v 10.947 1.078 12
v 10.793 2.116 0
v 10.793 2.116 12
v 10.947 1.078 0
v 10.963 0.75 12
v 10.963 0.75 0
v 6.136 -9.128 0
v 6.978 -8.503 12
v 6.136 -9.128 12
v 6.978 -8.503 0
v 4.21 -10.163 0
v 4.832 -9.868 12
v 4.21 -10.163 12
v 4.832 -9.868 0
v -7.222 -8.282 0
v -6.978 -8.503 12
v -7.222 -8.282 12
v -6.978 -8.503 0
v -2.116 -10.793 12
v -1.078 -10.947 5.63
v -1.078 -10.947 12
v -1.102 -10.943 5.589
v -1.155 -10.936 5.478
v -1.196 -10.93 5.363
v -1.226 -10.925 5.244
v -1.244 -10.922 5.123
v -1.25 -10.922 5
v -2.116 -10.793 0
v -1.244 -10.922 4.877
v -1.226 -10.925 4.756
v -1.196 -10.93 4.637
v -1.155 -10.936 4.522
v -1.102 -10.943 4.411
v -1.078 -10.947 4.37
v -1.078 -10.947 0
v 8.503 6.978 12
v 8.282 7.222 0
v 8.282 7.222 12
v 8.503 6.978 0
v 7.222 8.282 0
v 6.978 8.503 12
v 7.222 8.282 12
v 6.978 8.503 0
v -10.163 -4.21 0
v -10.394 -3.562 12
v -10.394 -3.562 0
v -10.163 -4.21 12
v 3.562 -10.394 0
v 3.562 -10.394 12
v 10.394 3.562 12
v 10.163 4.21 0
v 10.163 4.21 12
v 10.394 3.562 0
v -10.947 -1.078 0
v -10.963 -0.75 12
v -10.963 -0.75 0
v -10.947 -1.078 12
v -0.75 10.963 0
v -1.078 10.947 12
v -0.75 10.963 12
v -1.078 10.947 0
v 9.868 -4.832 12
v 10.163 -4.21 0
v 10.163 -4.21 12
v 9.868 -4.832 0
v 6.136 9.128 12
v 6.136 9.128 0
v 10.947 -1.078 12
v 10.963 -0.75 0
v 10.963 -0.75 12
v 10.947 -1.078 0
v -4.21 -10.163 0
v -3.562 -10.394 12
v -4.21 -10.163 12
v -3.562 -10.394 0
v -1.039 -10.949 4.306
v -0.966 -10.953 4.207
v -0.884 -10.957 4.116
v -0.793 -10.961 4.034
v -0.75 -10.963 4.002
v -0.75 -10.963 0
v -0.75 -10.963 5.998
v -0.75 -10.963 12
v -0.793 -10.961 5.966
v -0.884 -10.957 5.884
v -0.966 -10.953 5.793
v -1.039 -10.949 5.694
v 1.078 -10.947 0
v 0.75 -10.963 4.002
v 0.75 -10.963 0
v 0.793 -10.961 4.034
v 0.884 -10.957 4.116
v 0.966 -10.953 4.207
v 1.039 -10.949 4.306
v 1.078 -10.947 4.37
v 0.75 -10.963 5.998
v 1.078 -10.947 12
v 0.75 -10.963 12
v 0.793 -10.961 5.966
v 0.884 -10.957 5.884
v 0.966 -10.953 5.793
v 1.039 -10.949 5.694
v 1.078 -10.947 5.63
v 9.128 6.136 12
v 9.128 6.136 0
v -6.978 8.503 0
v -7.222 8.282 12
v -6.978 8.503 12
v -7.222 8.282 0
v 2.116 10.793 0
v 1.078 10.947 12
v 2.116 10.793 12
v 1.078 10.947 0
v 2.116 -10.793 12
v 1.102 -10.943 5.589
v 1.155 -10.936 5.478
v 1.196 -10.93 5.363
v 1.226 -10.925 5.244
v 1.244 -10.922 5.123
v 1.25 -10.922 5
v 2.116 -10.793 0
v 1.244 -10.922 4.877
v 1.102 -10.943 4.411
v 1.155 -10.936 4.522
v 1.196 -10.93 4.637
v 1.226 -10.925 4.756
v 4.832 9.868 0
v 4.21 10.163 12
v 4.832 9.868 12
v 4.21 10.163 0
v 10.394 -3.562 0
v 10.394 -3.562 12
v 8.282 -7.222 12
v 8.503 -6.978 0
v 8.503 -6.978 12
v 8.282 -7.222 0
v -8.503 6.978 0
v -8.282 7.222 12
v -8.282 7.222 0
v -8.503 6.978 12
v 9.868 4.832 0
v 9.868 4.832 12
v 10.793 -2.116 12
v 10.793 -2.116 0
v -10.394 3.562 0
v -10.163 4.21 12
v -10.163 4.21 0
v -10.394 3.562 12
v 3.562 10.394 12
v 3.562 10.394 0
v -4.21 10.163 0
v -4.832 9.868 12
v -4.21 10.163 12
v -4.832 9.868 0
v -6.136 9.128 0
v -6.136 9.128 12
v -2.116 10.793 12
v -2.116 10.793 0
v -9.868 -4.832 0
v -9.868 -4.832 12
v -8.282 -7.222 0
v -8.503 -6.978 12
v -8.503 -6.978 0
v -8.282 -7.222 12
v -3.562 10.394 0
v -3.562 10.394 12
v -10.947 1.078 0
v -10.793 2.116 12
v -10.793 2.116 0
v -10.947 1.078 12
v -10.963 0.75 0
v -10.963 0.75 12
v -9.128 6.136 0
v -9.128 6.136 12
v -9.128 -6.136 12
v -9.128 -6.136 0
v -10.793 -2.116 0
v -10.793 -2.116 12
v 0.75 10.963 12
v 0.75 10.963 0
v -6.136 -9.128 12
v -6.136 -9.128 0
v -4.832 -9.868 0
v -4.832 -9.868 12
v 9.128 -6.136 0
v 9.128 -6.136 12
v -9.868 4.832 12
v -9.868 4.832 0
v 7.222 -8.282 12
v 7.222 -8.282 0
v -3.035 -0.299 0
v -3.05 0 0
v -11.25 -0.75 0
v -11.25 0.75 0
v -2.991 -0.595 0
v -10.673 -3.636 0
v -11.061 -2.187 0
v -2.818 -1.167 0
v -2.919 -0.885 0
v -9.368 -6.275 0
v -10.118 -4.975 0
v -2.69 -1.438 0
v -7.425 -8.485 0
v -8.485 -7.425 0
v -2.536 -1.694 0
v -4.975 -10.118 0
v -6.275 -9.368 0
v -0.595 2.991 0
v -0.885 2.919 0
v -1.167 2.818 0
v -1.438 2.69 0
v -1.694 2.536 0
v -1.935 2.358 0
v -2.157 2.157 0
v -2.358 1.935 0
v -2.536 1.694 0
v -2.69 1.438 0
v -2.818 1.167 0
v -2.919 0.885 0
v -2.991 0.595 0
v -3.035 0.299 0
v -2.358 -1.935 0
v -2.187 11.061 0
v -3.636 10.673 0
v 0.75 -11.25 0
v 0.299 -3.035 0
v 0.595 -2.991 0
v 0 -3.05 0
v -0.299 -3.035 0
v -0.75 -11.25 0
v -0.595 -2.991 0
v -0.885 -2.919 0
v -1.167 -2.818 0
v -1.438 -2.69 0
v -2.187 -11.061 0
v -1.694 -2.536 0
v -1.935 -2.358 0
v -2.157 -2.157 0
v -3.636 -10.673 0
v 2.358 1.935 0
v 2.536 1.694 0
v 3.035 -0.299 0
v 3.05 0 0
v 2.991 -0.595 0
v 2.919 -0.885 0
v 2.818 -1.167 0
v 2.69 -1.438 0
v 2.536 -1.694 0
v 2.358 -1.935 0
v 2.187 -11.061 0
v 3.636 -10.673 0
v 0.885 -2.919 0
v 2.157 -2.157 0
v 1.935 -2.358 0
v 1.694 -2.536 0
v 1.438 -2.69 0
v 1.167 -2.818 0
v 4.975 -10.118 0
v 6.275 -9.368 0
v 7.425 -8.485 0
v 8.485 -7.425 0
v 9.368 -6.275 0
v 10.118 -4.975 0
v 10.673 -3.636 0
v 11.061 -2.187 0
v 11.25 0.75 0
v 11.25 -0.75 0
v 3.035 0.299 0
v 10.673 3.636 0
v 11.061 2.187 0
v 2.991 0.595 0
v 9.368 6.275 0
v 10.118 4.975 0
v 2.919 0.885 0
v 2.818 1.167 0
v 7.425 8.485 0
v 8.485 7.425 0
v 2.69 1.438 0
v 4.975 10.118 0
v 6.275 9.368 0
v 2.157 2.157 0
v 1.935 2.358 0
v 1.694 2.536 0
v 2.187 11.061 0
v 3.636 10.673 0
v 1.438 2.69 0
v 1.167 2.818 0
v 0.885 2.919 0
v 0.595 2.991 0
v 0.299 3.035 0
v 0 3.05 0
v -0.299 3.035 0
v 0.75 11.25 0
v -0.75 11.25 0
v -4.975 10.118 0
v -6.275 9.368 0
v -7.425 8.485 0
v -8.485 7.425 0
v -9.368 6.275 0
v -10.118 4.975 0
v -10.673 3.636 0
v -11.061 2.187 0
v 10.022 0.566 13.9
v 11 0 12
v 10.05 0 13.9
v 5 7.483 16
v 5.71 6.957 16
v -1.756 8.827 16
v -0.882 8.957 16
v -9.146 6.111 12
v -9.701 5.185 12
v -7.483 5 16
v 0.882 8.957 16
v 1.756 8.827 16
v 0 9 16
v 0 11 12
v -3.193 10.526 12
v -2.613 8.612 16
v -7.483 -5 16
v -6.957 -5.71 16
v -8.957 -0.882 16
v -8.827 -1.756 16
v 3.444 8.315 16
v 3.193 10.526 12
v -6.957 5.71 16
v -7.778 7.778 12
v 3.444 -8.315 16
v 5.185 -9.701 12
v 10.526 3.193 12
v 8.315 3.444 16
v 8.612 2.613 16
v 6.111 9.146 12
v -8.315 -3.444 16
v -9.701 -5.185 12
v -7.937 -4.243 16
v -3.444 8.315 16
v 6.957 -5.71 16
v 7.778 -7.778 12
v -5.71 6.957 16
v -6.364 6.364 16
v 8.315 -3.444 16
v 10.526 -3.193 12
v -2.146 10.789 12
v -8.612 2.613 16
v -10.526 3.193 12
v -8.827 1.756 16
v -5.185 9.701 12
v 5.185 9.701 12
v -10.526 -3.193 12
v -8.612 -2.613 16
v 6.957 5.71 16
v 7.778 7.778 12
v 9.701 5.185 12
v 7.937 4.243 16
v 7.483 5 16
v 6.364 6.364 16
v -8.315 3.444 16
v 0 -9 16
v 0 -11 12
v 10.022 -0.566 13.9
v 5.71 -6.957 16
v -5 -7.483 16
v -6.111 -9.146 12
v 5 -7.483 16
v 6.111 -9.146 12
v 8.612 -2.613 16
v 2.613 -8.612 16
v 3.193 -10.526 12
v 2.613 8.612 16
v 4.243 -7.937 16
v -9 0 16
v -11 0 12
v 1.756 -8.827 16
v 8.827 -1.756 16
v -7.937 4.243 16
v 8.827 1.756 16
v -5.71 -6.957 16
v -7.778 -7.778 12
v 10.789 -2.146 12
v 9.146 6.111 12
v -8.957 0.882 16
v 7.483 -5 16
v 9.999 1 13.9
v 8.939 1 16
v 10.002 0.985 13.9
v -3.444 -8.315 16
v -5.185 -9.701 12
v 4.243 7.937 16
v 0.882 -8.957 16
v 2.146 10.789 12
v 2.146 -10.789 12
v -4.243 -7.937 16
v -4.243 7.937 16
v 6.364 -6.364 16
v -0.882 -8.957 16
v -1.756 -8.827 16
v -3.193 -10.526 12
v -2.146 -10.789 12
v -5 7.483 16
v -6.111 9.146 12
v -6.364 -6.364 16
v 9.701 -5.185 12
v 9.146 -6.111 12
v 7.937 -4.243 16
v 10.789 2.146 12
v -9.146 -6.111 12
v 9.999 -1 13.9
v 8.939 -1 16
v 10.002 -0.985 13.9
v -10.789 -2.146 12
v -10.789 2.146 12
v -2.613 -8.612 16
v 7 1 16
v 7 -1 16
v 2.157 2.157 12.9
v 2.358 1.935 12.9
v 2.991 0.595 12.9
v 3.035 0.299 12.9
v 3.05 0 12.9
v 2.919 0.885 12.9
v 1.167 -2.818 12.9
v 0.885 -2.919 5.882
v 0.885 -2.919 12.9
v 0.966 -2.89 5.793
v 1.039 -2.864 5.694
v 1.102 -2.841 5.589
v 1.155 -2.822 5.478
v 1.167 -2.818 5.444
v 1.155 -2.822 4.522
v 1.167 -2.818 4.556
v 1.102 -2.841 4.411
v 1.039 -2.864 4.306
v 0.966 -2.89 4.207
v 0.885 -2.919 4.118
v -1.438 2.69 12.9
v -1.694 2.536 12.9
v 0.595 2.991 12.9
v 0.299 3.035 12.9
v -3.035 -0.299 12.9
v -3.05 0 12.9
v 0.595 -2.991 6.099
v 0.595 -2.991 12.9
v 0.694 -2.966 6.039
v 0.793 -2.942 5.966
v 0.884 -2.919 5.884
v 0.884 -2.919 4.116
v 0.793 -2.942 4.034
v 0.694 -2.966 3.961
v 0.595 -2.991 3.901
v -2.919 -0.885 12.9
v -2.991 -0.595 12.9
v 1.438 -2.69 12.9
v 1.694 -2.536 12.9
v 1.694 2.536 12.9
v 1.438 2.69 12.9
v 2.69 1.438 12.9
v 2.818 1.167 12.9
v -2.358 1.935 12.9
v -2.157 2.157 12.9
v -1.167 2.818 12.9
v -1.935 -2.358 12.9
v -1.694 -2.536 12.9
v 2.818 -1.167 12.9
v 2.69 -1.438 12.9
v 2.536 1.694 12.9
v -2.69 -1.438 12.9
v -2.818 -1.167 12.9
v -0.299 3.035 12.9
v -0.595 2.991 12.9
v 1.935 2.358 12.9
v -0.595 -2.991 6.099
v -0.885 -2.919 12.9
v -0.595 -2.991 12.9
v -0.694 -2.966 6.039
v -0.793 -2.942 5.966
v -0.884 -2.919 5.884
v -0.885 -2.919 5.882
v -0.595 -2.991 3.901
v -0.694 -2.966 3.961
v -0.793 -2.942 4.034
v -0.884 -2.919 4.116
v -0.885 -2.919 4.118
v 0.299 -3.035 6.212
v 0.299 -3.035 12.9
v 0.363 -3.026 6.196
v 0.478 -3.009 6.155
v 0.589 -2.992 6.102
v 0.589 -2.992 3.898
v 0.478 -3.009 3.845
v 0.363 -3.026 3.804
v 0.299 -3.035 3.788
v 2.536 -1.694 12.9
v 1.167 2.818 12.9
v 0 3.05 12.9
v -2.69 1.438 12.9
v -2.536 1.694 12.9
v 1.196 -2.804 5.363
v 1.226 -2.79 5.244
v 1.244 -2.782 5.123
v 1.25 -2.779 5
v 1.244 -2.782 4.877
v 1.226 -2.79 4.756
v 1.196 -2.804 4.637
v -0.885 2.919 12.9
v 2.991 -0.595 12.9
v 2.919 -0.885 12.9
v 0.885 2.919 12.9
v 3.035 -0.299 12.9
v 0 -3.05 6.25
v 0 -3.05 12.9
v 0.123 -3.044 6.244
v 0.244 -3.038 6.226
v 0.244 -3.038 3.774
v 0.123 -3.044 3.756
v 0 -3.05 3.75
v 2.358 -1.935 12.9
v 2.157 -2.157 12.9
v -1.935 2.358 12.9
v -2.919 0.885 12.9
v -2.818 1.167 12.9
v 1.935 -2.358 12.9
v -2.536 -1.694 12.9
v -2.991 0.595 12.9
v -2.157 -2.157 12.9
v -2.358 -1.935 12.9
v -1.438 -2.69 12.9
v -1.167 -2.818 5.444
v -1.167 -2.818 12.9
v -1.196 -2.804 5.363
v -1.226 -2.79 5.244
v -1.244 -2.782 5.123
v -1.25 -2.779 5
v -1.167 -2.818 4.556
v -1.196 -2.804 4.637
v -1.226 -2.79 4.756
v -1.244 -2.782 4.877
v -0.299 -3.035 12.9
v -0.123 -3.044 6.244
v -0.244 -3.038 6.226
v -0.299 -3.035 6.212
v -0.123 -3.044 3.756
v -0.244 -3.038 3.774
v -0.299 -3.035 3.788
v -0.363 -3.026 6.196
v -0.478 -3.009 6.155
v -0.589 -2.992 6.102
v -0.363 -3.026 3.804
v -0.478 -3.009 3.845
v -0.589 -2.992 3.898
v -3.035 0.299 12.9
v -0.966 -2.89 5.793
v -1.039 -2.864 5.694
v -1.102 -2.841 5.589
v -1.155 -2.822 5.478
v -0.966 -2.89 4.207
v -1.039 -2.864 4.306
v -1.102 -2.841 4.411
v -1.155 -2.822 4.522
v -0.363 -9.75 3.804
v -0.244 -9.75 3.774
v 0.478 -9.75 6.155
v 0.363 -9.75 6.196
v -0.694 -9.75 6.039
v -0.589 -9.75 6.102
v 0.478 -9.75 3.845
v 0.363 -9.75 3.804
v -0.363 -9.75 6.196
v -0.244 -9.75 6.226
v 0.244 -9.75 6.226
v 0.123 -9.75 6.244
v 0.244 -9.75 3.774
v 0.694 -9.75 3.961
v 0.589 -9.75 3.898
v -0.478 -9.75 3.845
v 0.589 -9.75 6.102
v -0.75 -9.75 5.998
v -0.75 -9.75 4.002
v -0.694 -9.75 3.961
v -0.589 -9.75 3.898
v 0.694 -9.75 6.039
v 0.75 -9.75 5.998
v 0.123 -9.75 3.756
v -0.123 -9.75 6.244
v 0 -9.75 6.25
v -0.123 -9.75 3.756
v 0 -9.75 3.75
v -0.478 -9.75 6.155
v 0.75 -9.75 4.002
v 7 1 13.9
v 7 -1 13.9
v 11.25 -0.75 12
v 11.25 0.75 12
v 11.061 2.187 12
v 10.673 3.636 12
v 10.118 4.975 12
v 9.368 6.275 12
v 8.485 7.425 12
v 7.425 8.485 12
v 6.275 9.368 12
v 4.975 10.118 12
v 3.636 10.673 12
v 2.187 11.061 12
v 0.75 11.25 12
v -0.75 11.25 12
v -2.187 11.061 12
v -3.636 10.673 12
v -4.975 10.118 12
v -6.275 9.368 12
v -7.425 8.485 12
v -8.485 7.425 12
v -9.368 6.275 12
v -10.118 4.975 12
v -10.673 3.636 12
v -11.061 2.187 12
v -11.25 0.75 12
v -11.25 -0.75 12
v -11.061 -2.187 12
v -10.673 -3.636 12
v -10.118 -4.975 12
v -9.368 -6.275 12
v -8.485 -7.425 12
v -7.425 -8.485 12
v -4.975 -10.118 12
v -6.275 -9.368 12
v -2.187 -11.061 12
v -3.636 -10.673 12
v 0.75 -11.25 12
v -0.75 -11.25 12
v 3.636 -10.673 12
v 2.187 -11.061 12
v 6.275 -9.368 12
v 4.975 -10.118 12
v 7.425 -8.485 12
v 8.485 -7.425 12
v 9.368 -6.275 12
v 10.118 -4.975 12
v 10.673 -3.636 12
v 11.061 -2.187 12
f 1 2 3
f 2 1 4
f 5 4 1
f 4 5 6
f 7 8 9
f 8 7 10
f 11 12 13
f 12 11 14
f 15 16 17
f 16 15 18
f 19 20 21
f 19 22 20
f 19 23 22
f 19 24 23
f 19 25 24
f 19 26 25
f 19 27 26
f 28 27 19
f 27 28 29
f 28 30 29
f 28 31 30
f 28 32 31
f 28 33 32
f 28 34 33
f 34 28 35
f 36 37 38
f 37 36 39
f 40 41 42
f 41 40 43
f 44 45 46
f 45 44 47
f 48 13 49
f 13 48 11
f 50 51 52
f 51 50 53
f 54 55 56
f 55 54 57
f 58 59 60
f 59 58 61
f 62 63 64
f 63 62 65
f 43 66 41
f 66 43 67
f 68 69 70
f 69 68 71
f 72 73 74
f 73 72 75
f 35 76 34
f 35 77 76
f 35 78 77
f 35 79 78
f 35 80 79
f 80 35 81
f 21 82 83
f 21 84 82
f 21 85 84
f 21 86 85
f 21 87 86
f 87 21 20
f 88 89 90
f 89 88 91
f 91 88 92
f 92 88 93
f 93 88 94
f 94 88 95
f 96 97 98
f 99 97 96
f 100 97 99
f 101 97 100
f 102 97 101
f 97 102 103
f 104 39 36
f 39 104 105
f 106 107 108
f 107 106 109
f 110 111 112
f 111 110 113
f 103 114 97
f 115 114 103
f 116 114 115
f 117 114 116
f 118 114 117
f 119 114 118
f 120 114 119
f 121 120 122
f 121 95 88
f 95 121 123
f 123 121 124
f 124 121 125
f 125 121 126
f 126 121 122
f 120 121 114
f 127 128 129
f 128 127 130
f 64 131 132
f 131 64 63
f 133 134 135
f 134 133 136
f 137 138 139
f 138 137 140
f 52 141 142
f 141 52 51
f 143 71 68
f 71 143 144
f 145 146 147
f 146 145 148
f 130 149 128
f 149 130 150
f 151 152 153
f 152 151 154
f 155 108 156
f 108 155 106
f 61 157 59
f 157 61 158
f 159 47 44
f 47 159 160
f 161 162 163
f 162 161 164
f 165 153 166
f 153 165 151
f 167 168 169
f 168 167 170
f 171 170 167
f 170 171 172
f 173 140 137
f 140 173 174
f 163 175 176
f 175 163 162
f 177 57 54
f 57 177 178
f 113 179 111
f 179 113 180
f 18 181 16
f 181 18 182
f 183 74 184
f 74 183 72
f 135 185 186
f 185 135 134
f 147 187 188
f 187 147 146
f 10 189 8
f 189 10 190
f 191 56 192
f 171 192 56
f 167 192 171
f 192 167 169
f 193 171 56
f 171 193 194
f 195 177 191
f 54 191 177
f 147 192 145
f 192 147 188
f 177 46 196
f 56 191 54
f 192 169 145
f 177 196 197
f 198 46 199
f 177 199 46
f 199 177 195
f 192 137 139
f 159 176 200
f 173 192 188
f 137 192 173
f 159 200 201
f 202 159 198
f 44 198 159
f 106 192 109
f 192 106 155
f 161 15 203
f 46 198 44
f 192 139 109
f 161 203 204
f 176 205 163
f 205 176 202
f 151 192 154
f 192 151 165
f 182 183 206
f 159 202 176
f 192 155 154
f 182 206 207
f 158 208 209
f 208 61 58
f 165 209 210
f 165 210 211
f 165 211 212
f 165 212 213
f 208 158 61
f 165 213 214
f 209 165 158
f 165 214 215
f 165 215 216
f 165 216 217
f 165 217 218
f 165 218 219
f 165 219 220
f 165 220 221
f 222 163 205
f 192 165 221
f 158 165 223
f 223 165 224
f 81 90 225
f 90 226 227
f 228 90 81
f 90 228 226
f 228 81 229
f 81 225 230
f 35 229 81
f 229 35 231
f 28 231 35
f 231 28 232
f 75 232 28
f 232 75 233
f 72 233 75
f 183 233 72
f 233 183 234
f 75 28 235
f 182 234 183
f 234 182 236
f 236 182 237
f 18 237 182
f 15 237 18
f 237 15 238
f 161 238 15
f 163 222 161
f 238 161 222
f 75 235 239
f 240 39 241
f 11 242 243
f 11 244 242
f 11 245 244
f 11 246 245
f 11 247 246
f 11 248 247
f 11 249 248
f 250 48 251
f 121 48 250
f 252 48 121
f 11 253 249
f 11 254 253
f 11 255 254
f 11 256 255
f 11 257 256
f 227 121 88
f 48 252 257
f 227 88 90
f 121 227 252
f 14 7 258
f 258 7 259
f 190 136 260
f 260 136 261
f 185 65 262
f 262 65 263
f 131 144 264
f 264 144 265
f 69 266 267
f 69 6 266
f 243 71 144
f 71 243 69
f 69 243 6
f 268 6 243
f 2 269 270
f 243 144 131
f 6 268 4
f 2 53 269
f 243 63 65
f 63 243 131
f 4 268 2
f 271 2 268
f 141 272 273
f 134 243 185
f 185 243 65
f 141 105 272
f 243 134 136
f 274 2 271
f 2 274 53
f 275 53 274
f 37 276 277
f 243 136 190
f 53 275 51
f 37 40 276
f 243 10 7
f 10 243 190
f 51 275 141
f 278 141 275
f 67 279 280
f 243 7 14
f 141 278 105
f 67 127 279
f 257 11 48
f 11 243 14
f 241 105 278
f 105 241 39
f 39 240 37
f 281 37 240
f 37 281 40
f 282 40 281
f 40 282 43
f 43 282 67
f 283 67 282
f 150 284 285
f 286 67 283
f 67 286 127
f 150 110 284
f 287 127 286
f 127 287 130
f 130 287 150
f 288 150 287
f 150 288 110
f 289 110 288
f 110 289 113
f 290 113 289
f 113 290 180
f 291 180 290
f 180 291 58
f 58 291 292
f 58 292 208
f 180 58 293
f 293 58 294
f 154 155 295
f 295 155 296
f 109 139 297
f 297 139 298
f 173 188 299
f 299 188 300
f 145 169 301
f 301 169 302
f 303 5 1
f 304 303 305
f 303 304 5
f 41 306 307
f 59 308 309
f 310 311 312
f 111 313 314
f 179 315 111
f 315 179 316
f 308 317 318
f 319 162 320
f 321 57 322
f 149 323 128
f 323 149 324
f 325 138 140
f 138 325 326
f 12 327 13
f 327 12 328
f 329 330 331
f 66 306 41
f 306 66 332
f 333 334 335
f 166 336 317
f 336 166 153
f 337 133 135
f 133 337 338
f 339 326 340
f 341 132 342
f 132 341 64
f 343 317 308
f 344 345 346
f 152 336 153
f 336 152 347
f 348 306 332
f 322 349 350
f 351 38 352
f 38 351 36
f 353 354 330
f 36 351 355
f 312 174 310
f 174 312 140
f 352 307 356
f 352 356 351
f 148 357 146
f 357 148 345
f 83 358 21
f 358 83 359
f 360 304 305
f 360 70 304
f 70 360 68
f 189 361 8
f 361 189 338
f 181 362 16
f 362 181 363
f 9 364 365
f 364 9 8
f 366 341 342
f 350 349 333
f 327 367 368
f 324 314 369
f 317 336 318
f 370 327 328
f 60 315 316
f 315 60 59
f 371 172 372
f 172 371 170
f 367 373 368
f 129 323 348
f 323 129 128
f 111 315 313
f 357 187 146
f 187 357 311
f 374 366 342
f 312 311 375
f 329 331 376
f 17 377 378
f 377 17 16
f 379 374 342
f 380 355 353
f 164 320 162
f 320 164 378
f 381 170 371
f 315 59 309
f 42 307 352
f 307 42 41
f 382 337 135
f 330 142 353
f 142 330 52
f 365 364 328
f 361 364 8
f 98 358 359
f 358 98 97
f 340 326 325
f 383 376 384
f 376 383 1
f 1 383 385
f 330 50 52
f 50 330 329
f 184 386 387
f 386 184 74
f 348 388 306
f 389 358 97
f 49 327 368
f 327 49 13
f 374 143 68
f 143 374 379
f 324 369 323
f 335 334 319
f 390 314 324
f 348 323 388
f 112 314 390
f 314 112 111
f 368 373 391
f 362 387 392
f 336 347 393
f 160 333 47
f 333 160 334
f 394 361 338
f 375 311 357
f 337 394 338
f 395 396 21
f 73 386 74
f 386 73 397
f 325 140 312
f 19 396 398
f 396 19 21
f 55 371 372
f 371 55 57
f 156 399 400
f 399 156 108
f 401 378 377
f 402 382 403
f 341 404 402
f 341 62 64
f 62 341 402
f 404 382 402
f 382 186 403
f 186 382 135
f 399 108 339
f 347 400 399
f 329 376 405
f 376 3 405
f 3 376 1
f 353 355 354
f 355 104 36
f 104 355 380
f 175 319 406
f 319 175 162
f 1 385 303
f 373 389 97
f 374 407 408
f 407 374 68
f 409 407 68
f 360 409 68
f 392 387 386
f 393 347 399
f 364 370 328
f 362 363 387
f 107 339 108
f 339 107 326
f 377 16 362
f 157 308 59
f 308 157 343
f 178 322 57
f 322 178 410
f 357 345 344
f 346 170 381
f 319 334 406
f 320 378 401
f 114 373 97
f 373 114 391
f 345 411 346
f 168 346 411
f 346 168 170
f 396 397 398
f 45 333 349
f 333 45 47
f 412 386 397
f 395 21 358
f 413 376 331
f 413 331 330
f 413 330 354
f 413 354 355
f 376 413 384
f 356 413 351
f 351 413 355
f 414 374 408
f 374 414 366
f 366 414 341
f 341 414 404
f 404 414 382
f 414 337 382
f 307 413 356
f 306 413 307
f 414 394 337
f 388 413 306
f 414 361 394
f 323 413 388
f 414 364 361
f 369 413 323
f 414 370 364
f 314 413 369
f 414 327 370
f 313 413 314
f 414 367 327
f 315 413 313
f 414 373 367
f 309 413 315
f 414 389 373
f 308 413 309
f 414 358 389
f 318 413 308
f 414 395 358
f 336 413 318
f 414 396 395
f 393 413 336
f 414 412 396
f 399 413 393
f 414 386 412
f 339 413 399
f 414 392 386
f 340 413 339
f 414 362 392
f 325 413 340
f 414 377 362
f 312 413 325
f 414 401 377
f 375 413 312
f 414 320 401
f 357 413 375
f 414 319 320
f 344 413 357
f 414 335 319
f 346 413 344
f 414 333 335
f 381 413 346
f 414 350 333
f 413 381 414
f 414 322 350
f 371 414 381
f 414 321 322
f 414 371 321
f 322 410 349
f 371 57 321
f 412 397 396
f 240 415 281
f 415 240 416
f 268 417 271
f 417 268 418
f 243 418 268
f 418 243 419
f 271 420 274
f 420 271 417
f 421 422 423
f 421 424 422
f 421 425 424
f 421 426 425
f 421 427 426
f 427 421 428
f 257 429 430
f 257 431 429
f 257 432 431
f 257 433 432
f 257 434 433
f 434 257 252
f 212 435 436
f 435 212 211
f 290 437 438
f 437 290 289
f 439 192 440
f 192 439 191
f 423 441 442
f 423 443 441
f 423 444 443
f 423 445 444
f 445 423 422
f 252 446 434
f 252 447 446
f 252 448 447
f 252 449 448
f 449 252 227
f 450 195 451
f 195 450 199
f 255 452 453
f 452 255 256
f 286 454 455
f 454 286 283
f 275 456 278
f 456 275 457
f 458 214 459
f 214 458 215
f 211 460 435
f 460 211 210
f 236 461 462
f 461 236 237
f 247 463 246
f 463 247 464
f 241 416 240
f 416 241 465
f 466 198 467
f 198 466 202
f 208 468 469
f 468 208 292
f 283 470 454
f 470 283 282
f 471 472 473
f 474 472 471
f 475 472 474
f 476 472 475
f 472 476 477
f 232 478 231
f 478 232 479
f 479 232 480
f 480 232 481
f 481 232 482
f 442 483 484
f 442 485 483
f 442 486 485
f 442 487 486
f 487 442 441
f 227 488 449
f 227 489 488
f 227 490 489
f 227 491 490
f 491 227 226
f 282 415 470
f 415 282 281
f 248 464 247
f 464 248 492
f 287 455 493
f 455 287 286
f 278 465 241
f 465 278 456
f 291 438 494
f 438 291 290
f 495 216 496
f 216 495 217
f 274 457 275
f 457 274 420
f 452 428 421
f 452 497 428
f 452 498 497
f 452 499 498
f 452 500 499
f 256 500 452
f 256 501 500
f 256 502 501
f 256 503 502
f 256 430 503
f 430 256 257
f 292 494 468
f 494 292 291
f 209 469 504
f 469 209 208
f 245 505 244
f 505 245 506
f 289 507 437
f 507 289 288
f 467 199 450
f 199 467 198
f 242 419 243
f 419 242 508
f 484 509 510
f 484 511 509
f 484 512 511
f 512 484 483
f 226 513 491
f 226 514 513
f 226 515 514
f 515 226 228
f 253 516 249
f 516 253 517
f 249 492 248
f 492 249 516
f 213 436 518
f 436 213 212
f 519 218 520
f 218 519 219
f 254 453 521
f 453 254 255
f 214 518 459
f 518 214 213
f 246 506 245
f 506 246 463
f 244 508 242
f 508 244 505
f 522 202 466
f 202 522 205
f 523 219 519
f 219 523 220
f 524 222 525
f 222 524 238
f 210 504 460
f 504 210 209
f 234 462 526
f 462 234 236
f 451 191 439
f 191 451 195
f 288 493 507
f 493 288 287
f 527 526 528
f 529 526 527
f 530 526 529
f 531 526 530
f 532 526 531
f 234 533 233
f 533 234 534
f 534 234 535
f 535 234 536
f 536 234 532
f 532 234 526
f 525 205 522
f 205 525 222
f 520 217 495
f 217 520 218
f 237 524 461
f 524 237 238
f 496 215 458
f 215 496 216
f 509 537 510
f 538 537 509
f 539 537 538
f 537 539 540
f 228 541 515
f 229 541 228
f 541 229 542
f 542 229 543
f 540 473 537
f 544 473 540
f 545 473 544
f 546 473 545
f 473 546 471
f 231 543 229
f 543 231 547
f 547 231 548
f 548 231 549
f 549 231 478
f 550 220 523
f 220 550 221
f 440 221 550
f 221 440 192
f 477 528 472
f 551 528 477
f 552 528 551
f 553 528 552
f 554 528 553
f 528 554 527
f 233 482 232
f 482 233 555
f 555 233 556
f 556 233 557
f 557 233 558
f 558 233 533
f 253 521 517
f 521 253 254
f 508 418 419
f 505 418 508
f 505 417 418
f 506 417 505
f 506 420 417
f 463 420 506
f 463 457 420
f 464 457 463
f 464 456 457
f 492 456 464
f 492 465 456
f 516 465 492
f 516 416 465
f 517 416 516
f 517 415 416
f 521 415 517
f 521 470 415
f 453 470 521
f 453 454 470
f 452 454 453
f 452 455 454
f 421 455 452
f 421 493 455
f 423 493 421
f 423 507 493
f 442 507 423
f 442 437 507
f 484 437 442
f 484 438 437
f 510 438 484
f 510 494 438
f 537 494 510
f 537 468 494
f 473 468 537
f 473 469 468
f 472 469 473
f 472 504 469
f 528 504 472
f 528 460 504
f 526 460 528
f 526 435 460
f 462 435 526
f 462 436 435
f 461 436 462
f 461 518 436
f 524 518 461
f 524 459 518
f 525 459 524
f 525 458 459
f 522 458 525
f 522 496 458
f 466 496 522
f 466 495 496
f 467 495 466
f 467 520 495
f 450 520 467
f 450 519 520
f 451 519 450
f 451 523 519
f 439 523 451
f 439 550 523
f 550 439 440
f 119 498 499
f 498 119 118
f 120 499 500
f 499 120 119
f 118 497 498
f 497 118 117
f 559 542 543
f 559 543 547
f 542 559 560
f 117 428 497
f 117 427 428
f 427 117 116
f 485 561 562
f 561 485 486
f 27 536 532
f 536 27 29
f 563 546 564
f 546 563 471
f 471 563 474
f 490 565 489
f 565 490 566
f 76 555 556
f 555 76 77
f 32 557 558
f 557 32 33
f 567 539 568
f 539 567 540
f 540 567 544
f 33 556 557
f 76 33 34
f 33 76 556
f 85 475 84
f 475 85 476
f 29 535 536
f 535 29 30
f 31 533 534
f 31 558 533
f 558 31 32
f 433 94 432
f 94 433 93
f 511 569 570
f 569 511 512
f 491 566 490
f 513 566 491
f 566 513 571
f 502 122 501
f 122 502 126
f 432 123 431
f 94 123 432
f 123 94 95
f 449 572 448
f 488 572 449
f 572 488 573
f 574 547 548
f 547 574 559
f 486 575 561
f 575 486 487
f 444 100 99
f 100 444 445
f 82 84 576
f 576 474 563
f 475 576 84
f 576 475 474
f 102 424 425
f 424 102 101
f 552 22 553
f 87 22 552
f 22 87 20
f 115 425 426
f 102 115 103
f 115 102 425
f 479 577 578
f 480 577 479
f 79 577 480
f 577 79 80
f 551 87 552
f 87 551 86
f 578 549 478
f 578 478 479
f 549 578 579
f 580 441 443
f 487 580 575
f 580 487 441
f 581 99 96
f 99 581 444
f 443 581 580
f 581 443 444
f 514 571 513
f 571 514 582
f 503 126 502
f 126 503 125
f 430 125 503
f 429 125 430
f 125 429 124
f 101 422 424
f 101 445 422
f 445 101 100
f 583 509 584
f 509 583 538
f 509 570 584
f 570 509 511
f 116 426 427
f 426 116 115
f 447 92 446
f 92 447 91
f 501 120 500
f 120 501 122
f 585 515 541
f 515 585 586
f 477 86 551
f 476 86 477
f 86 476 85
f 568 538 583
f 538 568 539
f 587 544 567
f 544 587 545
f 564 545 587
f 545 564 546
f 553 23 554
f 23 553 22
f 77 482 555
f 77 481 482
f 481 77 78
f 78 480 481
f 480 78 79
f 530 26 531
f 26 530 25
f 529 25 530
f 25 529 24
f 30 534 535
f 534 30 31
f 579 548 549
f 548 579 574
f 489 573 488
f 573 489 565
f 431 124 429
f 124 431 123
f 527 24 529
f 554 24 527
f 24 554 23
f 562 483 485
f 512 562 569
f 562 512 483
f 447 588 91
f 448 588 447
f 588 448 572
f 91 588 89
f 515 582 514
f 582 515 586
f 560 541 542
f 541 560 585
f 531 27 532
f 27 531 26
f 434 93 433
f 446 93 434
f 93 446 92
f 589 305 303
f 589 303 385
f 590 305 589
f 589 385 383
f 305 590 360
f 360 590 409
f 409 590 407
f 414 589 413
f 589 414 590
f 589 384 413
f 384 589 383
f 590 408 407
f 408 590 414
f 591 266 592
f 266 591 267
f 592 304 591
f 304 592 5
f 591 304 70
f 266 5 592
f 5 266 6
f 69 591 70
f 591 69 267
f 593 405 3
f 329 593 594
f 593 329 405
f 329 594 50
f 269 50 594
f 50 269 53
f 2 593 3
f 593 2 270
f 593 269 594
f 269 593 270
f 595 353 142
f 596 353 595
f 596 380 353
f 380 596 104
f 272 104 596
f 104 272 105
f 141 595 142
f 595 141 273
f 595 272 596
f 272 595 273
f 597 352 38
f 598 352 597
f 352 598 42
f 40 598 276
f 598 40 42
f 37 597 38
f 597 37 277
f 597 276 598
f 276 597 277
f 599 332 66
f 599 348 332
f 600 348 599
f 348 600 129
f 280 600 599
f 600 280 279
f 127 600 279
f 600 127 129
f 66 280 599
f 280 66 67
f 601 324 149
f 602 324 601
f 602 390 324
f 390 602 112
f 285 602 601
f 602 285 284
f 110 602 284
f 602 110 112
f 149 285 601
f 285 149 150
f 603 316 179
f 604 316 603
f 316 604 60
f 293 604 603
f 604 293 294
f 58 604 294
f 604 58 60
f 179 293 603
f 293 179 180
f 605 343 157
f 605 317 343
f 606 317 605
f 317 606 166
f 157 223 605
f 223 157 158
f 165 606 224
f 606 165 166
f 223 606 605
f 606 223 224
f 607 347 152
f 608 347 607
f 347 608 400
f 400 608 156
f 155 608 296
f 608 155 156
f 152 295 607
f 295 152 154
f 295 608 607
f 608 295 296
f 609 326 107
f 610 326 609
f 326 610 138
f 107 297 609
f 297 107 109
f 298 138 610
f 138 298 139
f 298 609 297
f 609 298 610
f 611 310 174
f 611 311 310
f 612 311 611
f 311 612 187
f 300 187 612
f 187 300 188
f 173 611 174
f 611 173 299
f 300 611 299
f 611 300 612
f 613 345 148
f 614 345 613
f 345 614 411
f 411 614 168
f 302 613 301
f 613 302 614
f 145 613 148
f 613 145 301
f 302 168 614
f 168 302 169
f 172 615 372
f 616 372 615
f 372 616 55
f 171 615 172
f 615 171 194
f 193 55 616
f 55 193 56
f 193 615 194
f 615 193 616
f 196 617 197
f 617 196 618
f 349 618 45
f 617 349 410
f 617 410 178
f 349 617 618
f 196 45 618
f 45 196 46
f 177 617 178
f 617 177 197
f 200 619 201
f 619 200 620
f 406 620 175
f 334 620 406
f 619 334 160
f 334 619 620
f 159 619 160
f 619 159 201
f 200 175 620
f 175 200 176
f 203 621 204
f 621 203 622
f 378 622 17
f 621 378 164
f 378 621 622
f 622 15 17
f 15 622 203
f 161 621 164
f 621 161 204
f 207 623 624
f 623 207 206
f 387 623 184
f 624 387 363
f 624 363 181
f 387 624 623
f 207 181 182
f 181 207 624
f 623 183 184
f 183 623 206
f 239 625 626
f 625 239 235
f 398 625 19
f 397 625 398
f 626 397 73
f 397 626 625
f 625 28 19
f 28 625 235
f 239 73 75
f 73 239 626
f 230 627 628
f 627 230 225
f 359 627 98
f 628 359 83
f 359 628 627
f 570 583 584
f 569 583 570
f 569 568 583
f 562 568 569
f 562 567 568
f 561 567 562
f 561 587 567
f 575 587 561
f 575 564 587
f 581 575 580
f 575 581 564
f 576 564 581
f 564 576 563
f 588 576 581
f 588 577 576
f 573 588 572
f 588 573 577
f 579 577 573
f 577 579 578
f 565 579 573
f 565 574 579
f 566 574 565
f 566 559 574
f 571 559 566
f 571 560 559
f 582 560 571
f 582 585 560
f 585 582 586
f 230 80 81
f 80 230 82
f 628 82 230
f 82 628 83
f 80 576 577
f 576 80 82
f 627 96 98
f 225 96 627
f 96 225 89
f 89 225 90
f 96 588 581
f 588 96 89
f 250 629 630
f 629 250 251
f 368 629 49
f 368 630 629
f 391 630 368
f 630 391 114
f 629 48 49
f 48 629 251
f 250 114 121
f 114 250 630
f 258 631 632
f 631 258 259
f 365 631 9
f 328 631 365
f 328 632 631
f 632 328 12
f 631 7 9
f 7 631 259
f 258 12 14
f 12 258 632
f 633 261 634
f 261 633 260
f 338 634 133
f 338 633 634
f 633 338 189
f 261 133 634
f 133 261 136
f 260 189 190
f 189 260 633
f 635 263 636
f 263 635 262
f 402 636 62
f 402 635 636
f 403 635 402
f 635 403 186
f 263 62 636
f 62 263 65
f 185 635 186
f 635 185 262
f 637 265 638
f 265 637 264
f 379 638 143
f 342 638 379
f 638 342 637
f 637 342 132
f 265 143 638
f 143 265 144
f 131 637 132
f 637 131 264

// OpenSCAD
// Knob for the 10k dial switch (6mm knurled shaft, e.g. WH138)
// Press-fit on the knurling + M3 set screw. Pointer notch shows the setting.
// Pairs with the knob recess in fan_housing.scad (recess d=20).
// Units: mm

shaft_d = 6.1;      // press fit on a 6mm knurled shaft
knob_d = 22;
knob_h = 16;

$fn = 64;

module knob() {
    difference() {
        // body with a slight taper feel (two stacked cylinders)
        union() {
            cylinder(d=knob_d, h=knob_h - 4);
            translate([0, 0, knob_h - 4]) cylinder(d1=knob_d, d2=knob_d - 4, h=4);
        }
        // shaft bore (blind, from the bottom)
        translate([0, 0, -0.1]) cylinder(d=shaft_d, h=knob_h - 3);
        // M3 set screw (radial)
        translate([0, 0, 5]) rotate([90, 0, 0])
            cylinder(d=2.5, h=knob_d/2 + 1);
        // pointer notch on the top rim
        translate([knob_d/2 - 4, -1, knob_h - 2.1]) cube([4, 2, 2.2]);
    }
    // grip ribs
    for (a = [0 : 15 : 345])
        rotate([0, 0, a])
            translate([knob_d/2 - 0.5, 0, (knob_h - 4)/2])
                cube([1.5, 1.5, knob_h - 4], center=true);
}

knob();
